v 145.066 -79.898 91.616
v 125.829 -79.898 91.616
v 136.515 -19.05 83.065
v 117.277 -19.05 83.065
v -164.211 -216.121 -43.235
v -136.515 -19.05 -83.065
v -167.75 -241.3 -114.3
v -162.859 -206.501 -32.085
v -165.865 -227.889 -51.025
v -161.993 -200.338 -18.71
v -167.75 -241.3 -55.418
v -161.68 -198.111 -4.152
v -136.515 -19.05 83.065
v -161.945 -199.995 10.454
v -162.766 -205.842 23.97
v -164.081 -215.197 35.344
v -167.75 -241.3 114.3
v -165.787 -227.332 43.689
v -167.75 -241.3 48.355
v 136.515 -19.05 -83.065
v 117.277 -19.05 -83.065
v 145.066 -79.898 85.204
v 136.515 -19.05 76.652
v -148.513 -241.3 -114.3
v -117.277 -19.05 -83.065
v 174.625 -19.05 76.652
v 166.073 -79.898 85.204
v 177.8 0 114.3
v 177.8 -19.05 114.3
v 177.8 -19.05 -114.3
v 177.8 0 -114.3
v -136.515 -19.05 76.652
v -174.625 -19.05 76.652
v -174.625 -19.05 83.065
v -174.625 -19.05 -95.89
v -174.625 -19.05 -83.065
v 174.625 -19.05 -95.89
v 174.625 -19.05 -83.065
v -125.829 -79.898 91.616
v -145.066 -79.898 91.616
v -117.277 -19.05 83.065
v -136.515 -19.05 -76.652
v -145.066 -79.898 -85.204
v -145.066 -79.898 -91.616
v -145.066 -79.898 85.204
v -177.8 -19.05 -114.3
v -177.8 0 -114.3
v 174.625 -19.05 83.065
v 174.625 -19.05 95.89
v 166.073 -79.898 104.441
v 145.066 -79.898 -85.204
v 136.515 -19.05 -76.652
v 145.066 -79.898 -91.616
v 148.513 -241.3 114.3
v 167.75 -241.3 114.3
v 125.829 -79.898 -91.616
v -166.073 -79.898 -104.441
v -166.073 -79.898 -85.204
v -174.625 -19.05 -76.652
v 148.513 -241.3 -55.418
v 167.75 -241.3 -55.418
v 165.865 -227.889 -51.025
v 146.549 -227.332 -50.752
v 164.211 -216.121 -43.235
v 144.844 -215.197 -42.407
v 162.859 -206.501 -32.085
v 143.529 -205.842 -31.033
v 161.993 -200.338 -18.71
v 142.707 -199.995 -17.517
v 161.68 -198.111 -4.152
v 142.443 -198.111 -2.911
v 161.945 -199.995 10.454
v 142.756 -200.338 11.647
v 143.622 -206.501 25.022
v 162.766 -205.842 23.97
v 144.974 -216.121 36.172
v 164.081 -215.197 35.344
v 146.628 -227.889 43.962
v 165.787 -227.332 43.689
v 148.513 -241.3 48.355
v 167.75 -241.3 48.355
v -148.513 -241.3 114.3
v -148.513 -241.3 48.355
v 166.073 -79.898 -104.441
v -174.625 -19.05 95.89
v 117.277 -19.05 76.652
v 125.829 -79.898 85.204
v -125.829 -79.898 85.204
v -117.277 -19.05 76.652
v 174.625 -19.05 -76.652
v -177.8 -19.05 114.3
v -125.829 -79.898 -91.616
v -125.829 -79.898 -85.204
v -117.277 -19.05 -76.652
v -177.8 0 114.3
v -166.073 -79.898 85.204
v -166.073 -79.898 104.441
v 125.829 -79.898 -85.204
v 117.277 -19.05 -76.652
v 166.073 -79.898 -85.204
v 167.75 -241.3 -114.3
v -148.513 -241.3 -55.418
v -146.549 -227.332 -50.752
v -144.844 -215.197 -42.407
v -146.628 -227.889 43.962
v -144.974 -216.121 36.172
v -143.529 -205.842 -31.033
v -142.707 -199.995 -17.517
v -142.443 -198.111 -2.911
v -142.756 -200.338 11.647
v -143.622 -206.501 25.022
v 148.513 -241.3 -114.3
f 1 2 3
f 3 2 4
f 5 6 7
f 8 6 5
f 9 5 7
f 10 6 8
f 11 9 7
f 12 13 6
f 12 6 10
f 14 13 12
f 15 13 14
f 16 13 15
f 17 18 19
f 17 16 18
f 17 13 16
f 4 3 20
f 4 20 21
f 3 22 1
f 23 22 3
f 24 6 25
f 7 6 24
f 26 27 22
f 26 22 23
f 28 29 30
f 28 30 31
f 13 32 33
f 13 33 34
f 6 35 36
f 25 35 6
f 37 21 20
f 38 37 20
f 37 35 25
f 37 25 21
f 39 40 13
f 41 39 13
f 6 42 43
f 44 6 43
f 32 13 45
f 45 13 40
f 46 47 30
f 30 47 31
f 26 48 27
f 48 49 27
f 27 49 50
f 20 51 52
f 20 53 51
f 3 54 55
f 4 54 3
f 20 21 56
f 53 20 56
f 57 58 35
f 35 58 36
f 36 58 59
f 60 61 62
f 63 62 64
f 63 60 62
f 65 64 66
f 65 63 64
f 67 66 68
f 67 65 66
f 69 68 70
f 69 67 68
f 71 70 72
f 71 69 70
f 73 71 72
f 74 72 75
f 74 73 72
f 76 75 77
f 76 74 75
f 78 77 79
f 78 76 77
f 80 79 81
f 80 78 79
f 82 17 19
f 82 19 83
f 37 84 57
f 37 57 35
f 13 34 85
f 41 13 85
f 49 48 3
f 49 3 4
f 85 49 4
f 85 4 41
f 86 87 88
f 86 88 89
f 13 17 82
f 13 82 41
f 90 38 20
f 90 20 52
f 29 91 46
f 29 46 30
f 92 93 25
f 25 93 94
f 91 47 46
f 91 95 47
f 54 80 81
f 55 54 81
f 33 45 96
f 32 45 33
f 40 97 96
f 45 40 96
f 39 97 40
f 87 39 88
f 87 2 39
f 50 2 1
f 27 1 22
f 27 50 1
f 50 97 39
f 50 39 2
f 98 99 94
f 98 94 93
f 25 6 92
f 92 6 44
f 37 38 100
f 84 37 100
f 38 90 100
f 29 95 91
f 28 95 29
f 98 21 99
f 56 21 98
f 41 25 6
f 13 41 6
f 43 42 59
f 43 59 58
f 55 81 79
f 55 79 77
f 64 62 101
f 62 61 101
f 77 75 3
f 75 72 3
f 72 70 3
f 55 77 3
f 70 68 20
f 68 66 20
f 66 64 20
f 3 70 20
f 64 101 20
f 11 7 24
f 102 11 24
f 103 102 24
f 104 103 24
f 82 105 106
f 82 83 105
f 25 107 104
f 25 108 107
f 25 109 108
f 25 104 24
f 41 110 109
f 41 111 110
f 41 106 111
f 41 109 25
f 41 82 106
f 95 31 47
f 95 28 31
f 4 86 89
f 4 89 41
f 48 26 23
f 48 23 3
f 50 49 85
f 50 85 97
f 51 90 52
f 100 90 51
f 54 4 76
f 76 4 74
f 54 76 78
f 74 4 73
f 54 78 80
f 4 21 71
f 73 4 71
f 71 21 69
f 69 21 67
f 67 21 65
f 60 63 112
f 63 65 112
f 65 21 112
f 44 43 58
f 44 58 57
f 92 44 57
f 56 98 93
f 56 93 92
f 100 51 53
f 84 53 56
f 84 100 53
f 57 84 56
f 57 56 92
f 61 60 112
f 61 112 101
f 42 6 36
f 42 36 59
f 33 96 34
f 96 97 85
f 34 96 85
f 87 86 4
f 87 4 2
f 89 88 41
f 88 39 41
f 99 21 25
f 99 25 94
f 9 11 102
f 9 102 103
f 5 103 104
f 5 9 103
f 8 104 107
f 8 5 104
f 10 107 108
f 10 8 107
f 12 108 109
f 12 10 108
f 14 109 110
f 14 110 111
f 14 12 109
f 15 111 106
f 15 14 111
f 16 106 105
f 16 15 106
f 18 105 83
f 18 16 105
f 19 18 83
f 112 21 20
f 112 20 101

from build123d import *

# Parameters (mm, degrees)
F1_DEPTH      = 114.3
F2_DEPTH      = 114.3
F2_DEPTH_BACK = 114.3
F3_DEPTH      = 114.3
F3_DEPTH_BACK = 114.3
F5_DEPTH      = 177.801
F5_DEPTH_BACK = 177.801
F7_DEPTH      = 177.8
F7_DEPTH_BACK = 177.8
F8_DEPTH      = 114.3
F8_DEPTH_BACK = 114.3


# Not quite as in the source:
# - an extrude ends at something that could not be found from the text; its depth is read off the source's solid


with BuildPart() as f1:
    # F0 (on Top) → F1 (new body, symmetric)
    with BuildSketch(Plane.XY):
        Polygon((-177.8, 0), (-177.8, -19.05), (-174.625, -19.05), (-136.5145635031, -19.05), (-117.2773482466, -19.05), (0, -19.05), (0, 0), align=None)
        Polygon((177.8, 0), (0, 0), (0, -19.05), (117.2773482466, -19.05), (136.5145635031, -19.05), (174.625, -19.05), (177.8, -19.05), align=None)
    extrude(amount=F1_DEPTH, both=True)


with BuildPart() as f2:
    # F0 (on Top) → F2 (new body, two sides)
    with BuildSketch(Plane.XY) as f2_sk:
        Polygon((136.5145635031, -19.05), (117.2773482466, -19.05), (125.8289445898, -79.8977696986), (145.0661598463, -79.8977696986), align=None)
        Polygon((145.0661598463, -79.8977696986), (125.8289445898, -79.8977696986), (148.5125487592, -241.3), (167.7497640157, -241.3), align=None)
    extrude(amount=-F2_DEPTH)
    extrude(f2_sk.sketch, amount=F2_DEPTH_BACK)


with BuildPart() as f3:
    # F0 (on Top) → F3 (new body, two sides)
    with BuildSketch(Plane.XY) as f3_sk:
        Polygon((-117.2773482466, -19.05), (-136.5145635031, -19.05), (-145.0661598463, -79.8977696986), (-125.8289445898, -79.8977696986), align=None)
        Polygon((-125.8289445898, -79.8977696986), (-145.0661598463, -79.8977696986), (-167.7497640157, -241.3), (-148.5125487592, -241.3), align=None)
    extrude(amount=F3_DEPTH)
    extrude(f3_sk.sketch, amount=-F3_DEPTH_BACK)


with BuildPart() as f5_tool:
    # F4 (on Right) → F5 (new body, two sides)
    with BuildSketch(Plane.YZ) as f5_sk:
        with BuildLine():
            Line((-241.3, 48.3545251191), (-241.3, -55.417560041))
            ThreePointArc((-241.3, -55.417560041), (-198.1072526182, -3.5315174609), (-241.3, 48.3545251191))
        make_face()
        Polygon((-241.3, -114.2999999998), (-19.05, -114.2999999998), (-19.05, -83.0647994877), align=None)
        Polygon((-241.3, 114.3000000004), (-19.05, 83.0647994877), (-19.05, 114.3000000004), align=None)
    extrude(amount=-F5_DEPTH)
    extrude(f5_sk.sketch, amount=F5_DEPTH_BACK)


with BuildPart() as f2_1:
    add(f2.part)

    # F5: cut by f5_tool
    add(f5_tool.part, mode=Mode.SUBTRACT)


with BuildPart() as f3_1:
    add(f3.part)

    # F5: cut by f5_tool
    add(f5_tool.part, mode=Mode.SUBTRACT)


with BuildPart() as f7:
    # F6 (on Right) → F7 (new body, two sides)
    with BuildSketch(Plane.YZ) as f7_sk:
        Polygon((-19.0500000004, -83.0647994877), (-19.0500000003, -76.6523944022), (-79.8977696986, -85.2039907455), (-79.8977696986, -91.616395831), align=None)
        Polygon((-19.0500000004, -95.8896096587), (-19.0500000004, -83.0647994877), (-79.8977696986, -91.616395831), (-79.8977696986, -104.4412060019), align=None)
    extrude(amount=F7_DEPTH)
    extrude(f7_sk.sketch, amount=-F7_DEPTH_BACK)


with BuildPart() as f7b:
    # F6 (on Right) → F7, piece 2 (new body, two sides)
    with BuildSketch(Plane.YZ) as f7_2_sk:
        Polygon((-19.0499999999, 76.6523944022), (-19.0499999999, 83.0647994877), (-79.8977696986, 91.616395831), (-79.8977696986, 85.2039907455), align=None)
        Polygon((-79.8977696986, 91.616395831), (-19.05, 83.0647994877), (-19.0499999999, 95.8896096587), (-79.8977696986, 104.4412060019), align=None)
    extrude(amount=F7_DEPTH)
    extrude(f7_2_sk.sketch, amount=-F7_DEPTH_BACK)


with BuildPart() as f8_tool:
    # F0 (on Top) → F8 (new body, two sides)
    with BuildSketch(Plane.XY) as f8_sk:
        Polygon((177.8, -79.8977696986), (177.8, -19.05), (174.625, -19.05), (166.0734036568, -79.8977696986), align=None)
        Polygon((-174.625, -19.05), (-177.8, -19.05), (-177.8, -79.8977696986), (-166.0734036568, -79.8977696986), align=None)
    extrude(amount=F8_DEPTH)
    extrude(f8_sk.sketch, amount=-F8_DEPTH_BACK)


with BuildPart() as f7_1:
    add(f7.part)

    # F8: cut by f8_tool
    add(f8_tool.part, mode=Mode.SUBTRACT)

    # F11: cut F2
    add(f2_1.part, mode=Mode.SUBTRACT)

    # F12: cut F3
    add(f3_1.part, mode=Mode.SUBTRACT)


with BuildPart() as f7b_1:
    add(f7b.part)

    # F8: cut by f8_tool
    add(f8_tool.part, mode=Mode.SUBTRACT)

    # F9: cut F3
    add(f3_1.part, mode=Mode.SUBTRACT)

    # F10: cut F2
    add(f2_1.part, mode=Mode.SUBTRACT)


solid = Compound([f1.part, f2_1.part, f3_1.part, f7_1.part, f7b_1.part])
